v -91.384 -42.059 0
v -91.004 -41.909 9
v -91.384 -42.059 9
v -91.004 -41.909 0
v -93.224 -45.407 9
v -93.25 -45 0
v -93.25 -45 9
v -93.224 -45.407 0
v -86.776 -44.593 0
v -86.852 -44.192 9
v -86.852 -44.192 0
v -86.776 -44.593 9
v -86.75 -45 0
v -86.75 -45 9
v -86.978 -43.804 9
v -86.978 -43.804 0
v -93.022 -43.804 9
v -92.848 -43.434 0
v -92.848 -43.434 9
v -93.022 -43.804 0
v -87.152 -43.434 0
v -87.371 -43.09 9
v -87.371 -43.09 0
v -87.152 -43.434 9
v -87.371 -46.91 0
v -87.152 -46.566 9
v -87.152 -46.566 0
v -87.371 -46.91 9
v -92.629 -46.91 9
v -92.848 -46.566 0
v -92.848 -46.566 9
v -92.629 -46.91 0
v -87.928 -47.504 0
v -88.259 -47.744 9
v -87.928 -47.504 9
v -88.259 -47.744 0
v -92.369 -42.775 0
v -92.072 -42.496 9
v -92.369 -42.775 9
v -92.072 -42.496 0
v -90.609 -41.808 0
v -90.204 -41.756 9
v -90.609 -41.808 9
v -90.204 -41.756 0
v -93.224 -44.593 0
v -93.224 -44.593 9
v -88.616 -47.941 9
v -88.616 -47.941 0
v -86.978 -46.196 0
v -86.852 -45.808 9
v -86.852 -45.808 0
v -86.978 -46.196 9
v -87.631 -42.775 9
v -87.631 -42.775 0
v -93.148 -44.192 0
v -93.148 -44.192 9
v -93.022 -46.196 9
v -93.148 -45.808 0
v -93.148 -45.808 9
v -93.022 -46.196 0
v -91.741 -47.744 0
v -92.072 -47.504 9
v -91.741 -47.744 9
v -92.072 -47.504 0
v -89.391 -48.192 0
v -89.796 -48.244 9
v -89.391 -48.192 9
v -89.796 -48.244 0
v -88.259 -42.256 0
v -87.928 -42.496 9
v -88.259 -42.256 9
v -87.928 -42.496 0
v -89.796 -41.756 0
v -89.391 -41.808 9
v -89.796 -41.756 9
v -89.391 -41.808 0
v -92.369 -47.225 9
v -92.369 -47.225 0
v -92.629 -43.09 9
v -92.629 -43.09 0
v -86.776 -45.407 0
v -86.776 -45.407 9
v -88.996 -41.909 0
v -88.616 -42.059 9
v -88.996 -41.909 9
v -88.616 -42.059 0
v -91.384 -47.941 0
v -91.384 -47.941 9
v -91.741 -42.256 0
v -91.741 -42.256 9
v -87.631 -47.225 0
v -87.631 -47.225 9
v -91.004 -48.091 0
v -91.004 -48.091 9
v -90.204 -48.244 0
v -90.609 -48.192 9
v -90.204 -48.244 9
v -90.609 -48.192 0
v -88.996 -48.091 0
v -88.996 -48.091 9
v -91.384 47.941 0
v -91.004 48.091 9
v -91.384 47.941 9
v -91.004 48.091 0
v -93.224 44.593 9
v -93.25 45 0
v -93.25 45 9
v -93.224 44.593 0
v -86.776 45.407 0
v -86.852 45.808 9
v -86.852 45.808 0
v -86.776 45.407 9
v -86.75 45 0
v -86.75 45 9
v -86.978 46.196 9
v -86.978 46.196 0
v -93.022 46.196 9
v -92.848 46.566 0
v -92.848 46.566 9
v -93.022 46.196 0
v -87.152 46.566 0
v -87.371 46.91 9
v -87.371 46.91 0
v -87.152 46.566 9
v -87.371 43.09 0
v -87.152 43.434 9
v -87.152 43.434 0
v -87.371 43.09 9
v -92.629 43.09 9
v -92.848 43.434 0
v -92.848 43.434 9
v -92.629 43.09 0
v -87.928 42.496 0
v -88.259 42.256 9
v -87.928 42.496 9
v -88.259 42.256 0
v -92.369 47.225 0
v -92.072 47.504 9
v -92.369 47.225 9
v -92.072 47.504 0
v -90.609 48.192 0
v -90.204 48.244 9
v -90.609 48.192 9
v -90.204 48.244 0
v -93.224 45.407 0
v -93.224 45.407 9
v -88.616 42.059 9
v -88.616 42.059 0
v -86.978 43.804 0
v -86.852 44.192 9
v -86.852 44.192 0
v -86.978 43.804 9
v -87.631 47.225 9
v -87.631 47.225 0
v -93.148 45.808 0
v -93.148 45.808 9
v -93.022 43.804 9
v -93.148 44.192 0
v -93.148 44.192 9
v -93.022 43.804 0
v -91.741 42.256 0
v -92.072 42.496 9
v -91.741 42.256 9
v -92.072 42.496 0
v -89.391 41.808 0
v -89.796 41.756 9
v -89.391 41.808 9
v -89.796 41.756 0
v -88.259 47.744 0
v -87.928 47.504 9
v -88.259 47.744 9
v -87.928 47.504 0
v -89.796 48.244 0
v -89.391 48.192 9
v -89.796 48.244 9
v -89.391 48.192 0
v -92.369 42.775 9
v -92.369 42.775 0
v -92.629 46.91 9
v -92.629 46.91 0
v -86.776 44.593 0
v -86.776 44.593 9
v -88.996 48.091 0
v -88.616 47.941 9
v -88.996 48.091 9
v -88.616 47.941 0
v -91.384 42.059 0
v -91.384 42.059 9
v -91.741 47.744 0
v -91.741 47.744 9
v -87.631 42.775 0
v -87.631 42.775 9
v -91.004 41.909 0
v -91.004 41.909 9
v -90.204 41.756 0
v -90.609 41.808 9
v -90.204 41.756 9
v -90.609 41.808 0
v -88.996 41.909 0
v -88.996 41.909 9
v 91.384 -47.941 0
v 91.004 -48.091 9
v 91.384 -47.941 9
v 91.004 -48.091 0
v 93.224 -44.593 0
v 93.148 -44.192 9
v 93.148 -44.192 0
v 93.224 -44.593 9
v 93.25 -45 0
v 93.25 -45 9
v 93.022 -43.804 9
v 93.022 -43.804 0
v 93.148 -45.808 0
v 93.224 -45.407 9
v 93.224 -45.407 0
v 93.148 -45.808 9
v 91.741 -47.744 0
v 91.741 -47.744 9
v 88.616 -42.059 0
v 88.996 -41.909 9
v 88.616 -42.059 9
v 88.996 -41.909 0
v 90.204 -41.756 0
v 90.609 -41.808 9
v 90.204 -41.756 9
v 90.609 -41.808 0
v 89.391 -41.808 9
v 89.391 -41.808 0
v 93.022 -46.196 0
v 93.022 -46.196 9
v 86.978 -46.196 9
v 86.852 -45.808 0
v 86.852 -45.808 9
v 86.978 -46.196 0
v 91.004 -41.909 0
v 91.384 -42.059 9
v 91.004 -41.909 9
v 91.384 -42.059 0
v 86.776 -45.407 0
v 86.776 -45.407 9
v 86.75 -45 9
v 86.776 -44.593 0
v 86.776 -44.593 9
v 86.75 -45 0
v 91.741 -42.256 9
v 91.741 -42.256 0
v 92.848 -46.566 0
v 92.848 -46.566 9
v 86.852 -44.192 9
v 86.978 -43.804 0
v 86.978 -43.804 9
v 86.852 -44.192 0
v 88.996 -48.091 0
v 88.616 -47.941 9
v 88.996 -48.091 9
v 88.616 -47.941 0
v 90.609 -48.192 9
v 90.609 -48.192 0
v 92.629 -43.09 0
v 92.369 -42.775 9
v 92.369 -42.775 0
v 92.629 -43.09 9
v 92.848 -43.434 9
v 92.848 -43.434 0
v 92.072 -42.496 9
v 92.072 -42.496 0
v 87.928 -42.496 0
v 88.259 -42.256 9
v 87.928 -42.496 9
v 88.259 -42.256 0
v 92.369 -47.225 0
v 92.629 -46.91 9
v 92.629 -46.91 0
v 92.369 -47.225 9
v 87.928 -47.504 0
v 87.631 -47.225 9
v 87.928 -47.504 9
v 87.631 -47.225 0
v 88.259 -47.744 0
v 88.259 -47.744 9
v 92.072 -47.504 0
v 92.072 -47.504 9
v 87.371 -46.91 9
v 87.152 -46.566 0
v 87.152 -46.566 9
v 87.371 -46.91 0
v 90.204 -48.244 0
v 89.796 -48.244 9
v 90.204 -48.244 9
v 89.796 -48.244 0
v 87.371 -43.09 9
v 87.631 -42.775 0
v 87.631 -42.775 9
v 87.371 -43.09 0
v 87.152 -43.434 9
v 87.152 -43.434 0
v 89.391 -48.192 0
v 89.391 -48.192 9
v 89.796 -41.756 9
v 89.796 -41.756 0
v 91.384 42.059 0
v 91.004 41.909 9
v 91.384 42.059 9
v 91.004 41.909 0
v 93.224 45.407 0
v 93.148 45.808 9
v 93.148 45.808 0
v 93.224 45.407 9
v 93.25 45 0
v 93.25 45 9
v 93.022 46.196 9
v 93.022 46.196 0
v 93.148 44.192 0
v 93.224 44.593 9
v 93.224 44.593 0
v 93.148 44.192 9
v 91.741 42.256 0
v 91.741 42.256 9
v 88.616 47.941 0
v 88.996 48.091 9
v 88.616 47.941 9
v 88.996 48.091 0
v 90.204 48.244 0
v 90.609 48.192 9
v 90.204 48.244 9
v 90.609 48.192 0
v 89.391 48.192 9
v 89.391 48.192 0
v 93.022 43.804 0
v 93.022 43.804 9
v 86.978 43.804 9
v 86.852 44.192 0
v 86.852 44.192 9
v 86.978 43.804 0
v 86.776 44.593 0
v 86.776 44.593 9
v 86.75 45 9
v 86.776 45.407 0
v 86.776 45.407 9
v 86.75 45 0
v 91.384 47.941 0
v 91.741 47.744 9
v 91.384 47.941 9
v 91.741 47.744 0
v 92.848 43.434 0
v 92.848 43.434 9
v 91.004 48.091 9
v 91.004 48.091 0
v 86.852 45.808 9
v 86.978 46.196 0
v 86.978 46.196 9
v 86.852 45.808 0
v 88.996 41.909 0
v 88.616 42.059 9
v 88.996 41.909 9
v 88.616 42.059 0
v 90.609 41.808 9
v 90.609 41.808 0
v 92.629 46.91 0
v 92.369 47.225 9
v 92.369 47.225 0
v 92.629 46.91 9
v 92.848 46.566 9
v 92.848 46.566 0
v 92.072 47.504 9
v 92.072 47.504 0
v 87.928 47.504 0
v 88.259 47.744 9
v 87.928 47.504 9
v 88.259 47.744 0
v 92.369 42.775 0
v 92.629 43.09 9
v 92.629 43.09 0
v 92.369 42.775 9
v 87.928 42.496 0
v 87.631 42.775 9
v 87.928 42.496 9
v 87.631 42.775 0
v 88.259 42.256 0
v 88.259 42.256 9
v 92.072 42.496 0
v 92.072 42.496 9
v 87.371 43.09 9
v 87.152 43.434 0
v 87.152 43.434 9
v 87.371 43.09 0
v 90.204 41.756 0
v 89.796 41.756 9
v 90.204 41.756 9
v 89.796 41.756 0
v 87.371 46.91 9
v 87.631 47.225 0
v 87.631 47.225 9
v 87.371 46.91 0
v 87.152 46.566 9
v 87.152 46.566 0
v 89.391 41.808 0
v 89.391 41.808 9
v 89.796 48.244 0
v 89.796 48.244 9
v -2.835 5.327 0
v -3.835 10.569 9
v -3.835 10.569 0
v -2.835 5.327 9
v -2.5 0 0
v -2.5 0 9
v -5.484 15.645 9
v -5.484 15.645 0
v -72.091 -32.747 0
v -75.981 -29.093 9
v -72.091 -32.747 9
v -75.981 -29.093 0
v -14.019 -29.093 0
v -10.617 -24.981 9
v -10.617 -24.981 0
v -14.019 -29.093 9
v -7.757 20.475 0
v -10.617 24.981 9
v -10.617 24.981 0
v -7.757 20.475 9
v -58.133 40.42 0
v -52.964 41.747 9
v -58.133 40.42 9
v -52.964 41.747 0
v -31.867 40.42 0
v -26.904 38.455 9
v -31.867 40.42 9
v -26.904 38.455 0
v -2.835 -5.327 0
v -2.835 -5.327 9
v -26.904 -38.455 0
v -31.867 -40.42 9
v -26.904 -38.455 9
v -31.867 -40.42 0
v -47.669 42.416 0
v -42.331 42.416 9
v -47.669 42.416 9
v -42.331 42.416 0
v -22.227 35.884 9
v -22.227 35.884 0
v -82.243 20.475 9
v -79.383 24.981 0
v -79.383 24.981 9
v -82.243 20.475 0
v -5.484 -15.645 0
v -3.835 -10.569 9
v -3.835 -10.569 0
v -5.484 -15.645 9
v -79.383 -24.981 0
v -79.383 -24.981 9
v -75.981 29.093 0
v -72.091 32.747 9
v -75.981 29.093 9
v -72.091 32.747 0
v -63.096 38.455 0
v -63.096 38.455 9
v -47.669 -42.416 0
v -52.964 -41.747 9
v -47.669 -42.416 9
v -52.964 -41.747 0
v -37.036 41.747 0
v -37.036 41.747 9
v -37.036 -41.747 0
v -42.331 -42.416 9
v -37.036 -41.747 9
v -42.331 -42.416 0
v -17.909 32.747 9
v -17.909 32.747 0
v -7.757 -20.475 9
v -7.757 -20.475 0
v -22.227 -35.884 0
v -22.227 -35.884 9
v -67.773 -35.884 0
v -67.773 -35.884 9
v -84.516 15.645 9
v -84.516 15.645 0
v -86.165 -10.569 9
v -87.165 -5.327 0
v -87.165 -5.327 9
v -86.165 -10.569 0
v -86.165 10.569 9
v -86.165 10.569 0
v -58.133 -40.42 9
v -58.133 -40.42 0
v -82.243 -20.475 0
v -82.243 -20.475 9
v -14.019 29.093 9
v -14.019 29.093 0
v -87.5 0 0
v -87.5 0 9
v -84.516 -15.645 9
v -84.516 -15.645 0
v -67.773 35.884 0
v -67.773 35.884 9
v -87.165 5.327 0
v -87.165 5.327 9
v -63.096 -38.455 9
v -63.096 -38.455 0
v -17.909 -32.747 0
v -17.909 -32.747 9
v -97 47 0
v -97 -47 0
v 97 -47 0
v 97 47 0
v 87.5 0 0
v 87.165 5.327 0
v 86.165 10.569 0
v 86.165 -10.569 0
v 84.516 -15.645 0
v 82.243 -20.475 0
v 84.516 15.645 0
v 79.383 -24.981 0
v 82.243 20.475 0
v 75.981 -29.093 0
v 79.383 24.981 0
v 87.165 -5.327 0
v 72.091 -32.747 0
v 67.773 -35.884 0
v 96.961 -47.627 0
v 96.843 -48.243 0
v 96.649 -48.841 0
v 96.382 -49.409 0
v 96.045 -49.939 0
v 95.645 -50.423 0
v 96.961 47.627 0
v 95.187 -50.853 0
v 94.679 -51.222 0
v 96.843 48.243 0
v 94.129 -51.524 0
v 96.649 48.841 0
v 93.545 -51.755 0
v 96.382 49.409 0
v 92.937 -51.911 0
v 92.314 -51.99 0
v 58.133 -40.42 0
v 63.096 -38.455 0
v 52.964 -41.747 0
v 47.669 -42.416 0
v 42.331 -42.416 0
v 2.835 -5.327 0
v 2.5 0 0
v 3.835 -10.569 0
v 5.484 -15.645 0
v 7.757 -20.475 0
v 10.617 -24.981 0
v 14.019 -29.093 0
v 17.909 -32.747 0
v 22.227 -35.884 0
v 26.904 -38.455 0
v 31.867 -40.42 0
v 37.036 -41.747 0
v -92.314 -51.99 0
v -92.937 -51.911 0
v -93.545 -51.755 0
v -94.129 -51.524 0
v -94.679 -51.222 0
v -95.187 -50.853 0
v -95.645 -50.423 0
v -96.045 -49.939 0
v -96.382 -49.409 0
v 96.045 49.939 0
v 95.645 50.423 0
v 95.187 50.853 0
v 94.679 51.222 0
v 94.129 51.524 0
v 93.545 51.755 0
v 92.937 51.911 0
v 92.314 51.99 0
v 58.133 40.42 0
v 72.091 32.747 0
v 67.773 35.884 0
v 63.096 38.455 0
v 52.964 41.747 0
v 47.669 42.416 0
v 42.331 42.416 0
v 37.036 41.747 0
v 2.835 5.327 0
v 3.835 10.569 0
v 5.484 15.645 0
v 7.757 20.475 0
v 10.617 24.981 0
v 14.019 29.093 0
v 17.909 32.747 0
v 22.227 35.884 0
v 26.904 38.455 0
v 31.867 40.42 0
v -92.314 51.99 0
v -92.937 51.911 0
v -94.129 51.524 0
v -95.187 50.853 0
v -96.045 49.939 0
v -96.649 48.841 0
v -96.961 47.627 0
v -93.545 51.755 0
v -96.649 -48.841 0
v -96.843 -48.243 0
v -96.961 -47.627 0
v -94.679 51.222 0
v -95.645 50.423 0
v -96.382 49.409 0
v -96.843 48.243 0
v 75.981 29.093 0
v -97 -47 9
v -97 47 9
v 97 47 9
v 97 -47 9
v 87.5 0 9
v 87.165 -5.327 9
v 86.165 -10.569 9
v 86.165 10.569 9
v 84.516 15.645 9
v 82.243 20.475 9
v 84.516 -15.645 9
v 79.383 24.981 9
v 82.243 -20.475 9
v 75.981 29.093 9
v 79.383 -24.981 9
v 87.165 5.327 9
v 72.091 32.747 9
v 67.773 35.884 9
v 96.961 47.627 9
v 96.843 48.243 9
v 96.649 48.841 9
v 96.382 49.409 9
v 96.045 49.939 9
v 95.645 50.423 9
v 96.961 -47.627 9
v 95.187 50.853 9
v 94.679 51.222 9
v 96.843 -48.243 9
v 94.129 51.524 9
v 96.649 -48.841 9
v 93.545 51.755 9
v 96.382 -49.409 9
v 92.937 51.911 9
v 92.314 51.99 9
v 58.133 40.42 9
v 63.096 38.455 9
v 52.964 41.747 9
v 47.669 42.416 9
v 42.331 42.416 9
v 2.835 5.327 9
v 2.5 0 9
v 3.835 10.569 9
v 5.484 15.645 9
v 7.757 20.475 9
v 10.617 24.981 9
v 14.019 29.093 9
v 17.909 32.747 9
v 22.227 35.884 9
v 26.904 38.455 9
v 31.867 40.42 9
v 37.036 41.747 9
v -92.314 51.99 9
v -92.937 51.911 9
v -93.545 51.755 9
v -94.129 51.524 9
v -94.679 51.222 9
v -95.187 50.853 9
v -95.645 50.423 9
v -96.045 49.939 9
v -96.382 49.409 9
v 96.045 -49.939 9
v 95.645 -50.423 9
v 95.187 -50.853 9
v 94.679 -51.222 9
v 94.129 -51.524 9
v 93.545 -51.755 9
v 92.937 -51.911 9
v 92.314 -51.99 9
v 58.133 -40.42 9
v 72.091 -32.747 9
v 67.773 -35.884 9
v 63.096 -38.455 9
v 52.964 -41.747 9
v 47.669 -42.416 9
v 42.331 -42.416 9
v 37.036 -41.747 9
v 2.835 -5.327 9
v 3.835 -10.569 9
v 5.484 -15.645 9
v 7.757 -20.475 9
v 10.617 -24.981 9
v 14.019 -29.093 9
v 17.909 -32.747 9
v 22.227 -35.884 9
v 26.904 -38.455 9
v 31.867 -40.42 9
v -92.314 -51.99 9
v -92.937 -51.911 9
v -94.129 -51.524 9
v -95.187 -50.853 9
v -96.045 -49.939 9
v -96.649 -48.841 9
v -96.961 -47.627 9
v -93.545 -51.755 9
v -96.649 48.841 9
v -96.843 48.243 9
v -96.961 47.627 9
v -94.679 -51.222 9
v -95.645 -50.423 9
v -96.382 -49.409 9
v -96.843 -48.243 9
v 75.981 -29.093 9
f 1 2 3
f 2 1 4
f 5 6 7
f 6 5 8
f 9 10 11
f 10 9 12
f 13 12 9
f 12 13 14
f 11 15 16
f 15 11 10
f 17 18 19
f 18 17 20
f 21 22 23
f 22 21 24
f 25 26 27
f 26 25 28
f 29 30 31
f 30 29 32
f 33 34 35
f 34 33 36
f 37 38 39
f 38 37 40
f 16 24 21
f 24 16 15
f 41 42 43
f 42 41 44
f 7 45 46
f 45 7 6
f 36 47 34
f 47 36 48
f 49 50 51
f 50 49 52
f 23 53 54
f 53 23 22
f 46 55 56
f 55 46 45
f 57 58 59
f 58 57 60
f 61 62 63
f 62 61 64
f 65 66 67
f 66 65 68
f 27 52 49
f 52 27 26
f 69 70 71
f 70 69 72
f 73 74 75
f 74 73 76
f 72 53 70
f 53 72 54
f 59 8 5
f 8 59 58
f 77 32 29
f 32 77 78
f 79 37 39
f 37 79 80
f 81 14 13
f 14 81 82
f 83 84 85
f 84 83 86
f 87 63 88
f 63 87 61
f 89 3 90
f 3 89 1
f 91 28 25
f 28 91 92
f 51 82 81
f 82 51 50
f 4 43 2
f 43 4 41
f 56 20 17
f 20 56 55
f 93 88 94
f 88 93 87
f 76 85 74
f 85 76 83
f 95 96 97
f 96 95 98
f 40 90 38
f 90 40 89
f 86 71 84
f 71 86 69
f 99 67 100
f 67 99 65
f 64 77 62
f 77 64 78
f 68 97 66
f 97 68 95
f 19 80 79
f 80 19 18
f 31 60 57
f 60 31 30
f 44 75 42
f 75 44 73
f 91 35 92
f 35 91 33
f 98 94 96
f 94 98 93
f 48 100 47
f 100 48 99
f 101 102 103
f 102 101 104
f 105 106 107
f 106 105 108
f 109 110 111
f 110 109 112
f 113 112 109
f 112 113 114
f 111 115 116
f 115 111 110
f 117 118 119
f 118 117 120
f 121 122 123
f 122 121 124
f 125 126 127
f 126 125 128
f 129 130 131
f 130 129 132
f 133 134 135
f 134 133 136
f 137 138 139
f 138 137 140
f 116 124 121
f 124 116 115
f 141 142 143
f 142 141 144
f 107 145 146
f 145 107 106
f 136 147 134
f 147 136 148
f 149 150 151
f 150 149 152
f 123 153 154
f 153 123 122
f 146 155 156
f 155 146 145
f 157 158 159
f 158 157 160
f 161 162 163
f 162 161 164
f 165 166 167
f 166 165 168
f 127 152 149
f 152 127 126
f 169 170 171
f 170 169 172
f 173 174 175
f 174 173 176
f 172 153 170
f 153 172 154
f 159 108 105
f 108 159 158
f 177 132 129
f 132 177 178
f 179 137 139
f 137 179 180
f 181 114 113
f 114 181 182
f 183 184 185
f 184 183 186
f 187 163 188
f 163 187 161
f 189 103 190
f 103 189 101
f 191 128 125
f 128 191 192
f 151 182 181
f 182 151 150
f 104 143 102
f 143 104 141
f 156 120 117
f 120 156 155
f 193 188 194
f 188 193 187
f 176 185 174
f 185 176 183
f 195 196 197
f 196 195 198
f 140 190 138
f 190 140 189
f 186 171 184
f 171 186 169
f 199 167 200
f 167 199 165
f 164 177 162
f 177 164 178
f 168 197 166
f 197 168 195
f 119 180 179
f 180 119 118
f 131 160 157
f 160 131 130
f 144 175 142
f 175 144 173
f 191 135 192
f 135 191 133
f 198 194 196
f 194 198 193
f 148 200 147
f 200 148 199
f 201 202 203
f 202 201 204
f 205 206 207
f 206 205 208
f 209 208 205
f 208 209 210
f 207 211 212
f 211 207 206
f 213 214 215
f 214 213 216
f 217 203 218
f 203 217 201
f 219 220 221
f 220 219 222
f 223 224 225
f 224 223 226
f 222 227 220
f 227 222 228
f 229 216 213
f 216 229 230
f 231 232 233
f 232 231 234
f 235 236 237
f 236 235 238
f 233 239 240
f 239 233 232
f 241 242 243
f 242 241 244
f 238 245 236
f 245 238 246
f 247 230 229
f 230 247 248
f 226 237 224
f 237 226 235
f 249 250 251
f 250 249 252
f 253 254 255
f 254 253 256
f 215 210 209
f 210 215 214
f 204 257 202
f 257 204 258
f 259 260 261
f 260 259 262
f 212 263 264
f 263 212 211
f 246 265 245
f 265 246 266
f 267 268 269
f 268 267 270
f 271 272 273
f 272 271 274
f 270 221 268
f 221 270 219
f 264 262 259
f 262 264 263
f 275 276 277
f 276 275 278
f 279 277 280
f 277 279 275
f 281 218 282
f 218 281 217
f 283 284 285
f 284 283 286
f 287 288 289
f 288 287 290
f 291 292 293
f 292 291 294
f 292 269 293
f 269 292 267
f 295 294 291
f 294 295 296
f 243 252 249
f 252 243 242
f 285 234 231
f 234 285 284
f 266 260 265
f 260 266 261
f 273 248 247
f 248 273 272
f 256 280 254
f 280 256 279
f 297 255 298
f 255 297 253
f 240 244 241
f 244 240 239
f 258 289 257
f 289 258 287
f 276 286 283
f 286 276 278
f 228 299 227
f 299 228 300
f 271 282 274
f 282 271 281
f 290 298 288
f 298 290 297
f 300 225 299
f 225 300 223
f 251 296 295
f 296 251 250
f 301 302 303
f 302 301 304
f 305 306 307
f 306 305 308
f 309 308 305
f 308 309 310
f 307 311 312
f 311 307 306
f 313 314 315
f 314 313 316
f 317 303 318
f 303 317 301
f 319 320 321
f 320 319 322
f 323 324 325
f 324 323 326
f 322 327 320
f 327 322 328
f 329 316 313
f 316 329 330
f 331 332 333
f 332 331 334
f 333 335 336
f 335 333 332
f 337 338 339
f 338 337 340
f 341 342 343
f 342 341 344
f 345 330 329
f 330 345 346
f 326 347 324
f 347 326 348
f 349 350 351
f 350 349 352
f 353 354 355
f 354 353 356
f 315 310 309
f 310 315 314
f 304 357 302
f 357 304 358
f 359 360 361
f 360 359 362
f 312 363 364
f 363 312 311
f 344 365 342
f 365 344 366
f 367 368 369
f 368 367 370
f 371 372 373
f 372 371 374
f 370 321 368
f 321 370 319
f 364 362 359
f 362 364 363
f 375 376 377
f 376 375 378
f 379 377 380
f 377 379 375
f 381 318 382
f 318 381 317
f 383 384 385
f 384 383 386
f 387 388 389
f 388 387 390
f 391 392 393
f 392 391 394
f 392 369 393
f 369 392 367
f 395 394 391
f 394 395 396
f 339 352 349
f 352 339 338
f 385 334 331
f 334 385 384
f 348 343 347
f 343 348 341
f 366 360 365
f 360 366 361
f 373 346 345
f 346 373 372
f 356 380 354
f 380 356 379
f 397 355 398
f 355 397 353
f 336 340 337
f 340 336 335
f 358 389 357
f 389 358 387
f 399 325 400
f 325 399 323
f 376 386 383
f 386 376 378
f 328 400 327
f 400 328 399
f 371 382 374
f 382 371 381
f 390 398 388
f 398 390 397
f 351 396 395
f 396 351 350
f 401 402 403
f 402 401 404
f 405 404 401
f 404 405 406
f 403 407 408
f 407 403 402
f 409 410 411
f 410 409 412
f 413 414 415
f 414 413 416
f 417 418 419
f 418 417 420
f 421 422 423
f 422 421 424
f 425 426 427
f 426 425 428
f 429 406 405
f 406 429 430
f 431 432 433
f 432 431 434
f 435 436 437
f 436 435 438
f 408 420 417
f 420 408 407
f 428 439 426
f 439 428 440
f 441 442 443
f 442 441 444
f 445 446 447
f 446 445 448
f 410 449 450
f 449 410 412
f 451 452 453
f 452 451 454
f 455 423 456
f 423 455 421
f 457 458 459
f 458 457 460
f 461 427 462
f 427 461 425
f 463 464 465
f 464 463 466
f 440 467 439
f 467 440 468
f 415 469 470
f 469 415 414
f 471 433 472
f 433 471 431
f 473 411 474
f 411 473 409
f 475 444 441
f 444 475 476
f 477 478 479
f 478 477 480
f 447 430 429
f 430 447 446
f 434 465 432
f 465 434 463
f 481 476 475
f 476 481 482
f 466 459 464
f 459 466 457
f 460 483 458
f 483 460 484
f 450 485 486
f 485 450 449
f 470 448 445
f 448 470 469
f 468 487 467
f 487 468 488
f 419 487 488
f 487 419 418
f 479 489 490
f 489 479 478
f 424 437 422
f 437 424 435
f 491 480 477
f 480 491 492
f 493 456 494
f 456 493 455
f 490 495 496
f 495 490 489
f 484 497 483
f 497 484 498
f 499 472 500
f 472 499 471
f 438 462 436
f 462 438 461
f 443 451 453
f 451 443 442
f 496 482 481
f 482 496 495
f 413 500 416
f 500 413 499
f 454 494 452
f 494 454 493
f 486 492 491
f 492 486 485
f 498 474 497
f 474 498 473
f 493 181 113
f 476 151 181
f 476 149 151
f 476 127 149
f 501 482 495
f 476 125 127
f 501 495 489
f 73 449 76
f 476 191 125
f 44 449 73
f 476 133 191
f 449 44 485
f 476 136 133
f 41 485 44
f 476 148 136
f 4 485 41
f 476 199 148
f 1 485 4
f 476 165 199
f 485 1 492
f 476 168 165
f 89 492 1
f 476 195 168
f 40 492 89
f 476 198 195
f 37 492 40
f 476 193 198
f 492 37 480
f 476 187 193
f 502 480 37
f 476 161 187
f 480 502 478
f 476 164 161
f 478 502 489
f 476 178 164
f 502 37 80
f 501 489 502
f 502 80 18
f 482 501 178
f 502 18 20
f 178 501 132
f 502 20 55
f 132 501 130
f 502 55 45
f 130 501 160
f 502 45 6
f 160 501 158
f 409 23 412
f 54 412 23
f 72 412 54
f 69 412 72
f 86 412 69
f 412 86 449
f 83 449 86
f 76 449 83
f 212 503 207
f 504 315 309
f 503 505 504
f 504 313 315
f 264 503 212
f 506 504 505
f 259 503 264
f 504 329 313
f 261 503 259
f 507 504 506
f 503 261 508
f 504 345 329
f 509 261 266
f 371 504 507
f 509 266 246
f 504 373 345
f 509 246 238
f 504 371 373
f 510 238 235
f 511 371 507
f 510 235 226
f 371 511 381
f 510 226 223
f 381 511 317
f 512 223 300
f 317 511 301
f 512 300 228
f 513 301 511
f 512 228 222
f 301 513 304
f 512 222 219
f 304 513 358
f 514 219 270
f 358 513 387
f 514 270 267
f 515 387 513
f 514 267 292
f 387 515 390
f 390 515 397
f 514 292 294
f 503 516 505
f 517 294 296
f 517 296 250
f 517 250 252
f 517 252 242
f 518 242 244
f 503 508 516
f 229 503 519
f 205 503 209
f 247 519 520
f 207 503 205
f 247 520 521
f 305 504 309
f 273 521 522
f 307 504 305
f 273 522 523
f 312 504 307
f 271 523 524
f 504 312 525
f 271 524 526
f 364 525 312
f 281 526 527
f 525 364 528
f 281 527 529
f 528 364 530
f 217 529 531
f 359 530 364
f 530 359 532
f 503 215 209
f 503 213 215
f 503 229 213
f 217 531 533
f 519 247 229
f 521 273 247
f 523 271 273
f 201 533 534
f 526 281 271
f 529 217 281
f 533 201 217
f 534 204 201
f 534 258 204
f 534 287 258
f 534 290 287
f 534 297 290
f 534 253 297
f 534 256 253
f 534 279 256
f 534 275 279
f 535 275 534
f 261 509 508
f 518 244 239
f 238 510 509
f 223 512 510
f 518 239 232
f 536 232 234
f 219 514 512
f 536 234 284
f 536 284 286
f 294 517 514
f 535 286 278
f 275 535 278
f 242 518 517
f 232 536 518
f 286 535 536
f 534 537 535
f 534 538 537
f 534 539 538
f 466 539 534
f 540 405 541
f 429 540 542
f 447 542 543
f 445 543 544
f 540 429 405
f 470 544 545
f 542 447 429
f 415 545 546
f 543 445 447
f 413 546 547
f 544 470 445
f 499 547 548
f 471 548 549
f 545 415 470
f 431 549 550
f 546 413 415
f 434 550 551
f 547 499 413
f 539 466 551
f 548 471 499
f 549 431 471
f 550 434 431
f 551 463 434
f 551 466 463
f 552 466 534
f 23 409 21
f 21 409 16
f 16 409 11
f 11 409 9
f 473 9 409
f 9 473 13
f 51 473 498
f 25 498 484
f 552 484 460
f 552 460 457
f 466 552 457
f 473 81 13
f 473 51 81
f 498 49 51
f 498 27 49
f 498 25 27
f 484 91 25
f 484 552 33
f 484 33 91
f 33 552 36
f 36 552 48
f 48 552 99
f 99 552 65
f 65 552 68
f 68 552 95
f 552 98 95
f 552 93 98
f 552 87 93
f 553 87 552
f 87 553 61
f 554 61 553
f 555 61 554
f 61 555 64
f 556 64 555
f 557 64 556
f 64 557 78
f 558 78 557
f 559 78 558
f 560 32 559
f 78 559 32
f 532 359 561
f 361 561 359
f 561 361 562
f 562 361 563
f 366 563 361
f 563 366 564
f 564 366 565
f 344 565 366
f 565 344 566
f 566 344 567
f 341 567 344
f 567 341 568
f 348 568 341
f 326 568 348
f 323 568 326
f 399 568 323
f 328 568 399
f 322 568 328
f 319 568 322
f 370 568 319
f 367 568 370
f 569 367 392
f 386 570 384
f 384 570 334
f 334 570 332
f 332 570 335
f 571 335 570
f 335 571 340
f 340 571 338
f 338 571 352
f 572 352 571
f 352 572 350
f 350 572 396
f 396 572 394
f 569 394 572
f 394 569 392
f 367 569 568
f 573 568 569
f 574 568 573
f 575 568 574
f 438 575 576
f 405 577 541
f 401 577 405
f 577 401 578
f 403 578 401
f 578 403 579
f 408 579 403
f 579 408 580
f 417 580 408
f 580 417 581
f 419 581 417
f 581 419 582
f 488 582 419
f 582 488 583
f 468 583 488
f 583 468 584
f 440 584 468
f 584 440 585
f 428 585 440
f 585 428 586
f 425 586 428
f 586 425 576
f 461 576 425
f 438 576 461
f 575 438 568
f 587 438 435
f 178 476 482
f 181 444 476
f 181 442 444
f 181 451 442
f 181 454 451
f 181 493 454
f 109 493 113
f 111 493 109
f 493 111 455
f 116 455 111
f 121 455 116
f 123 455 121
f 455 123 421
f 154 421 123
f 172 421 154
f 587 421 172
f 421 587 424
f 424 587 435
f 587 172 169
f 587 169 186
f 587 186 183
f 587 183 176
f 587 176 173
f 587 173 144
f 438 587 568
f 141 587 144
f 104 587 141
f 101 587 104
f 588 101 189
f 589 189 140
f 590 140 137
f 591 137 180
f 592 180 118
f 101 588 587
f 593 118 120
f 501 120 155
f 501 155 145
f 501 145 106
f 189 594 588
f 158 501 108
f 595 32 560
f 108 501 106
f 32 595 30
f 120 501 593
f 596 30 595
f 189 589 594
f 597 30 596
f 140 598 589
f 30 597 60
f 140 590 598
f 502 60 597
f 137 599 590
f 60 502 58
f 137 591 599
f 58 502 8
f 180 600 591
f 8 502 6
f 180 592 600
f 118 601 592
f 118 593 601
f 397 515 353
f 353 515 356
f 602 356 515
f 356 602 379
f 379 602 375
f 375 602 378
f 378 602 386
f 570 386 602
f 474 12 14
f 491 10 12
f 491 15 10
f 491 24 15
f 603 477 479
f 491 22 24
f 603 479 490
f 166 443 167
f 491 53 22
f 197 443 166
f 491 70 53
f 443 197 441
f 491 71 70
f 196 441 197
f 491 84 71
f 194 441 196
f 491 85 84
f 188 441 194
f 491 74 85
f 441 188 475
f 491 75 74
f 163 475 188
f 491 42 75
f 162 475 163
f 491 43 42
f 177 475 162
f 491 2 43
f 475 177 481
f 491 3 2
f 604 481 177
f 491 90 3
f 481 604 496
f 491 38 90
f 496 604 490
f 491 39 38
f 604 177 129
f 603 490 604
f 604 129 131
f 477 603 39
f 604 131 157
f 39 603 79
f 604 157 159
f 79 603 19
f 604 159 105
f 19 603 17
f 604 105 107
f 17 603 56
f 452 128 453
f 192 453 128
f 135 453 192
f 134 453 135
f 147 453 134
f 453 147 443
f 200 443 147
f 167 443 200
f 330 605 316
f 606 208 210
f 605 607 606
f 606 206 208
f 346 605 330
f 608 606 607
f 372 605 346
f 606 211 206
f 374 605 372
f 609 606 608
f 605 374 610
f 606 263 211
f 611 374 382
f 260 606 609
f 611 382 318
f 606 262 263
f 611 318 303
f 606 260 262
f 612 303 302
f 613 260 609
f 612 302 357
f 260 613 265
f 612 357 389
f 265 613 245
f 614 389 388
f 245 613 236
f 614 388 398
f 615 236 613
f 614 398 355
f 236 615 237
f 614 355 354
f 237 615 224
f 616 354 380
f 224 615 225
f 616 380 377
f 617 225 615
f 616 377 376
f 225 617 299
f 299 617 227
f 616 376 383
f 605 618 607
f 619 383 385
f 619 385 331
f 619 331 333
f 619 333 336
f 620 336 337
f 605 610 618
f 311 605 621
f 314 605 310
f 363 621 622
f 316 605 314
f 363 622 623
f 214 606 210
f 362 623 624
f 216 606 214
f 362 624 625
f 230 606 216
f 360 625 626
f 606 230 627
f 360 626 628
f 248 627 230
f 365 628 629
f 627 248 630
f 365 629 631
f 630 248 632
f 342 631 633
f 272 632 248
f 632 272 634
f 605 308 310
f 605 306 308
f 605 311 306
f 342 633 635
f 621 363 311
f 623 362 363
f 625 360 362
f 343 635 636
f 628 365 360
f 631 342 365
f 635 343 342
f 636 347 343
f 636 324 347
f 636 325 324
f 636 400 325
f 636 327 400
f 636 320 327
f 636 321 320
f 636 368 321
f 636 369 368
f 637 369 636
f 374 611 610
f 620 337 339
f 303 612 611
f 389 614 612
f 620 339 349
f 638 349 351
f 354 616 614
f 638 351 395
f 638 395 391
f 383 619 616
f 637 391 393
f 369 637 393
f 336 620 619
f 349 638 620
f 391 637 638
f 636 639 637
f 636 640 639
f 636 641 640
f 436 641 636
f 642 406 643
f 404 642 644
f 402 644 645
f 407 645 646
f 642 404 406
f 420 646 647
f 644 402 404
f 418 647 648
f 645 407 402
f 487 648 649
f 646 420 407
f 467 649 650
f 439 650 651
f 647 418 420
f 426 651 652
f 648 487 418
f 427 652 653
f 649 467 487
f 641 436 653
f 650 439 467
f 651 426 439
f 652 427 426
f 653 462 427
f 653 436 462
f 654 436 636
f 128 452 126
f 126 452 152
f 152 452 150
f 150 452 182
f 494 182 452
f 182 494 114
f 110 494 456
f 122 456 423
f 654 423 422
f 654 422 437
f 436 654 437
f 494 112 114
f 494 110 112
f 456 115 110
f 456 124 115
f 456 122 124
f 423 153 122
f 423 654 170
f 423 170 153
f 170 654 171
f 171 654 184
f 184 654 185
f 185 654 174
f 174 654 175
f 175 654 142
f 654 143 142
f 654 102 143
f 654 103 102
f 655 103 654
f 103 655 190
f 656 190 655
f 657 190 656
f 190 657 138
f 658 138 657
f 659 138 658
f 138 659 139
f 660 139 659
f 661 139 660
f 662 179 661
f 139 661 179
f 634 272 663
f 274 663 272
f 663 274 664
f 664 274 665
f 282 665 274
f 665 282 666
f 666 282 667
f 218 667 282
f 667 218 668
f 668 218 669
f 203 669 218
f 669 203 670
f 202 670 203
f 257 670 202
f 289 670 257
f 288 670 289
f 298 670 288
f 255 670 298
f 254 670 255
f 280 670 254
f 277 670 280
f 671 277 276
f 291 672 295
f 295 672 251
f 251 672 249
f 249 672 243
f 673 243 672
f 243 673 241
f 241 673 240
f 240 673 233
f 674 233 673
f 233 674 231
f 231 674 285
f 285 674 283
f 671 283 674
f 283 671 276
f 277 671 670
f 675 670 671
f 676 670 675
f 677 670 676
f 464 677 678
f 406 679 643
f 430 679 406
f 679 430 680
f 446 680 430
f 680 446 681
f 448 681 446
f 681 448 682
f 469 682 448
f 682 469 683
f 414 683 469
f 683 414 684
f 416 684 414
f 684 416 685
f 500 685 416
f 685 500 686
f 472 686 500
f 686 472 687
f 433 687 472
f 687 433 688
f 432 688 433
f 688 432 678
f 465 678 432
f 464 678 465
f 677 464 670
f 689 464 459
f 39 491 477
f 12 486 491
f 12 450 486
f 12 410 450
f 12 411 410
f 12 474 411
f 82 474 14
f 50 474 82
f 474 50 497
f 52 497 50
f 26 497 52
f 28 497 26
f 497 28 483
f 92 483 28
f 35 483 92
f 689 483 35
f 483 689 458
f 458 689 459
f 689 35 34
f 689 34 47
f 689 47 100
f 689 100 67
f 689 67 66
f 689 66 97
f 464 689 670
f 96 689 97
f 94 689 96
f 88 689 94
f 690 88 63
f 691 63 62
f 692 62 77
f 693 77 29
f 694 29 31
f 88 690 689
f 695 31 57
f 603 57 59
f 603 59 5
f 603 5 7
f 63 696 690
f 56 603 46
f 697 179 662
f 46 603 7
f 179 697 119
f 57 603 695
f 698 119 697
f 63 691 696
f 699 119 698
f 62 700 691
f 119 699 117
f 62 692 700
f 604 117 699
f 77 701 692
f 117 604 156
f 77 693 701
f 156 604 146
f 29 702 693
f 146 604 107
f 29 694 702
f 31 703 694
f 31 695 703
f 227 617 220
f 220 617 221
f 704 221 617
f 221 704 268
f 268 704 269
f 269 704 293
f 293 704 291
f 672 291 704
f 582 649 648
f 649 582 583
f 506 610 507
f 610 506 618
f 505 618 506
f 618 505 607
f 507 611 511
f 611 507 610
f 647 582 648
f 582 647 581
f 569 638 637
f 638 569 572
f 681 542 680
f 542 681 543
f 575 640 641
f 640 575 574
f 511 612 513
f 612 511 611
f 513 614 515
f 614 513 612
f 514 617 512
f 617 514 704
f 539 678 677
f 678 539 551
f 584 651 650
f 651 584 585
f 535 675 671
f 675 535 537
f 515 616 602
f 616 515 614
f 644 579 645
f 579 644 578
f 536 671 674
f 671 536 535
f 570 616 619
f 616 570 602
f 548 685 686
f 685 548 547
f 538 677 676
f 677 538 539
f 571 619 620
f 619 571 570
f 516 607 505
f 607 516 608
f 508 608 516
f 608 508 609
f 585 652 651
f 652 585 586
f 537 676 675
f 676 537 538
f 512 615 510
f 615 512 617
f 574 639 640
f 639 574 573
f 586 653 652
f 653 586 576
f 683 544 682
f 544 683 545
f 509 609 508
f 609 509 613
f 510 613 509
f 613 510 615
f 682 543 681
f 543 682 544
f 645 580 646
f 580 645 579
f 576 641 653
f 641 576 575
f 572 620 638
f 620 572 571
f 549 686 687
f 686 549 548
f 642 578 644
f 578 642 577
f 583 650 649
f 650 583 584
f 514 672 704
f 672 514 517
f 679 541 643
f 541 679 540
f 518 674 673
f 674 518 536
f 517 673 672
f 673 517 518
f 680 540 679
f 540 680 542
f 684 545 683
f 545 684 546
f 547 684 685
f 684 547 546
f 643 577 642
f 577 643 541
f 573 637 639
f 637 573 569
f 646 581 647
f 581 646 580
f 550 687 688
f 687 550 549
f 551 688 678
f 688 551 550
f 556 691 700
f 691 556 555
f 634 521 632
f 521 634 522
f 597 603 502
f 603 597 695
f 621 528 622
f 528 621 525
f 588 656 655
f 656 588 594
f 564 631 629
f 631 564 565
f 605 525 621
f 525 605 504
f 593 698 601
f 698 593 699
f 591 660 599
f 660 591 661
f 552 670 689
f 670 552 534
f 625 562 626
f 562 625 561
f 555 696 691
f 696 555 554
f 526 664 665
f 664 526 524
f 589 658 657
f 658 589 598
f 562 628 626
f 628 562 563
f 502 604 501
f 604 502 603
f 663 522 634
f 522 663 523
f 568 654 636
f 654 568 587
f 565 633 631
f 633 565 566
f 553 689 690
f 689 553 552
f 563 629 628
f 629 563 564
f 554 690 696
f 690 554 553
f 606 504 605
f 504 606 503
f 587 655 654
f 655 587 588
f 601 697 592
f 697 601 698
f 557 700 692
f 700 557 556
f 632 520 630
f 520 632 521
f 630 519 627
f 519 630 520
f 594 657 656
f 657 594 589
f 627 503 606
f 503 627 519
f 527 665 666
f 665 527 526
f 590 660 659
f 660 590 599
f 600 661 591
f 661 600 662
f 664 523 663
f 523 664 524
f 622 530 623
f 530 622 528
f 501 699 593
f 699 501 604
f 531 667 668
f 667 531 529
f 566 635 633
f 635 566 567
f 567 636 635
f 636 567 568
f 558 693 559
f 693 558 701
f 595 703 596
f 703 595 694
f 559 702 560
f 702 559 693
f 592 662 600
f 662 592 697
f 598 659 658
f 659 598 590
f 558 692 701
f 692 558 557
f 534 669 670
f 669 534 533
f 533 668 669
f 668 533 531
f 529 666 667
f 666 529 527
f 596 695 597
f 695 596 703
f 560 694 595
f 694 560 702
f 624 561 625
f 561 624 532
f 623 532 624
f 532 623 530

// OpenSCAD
$fn = 50;


difference() {
	union() {
		hull() {
			translate(v = [-92.0000000000, 47.0000000000, 0]) {
				cylinder(h = 9, r = 5);
			}
			translate(v = [92.0000000000, 47.0000000000, 0]) {
				cylinder(h = 9, r = 5);
			}
			translate(v = [-92.0000000000, -47.0000000000, 0]) {
				cylinder(h = 9, r = 5);
			}
			translate(v = [92.0000000000, -47.0000000000, 0]) {
				cylinder(h = 9, r = 5);
			}
		}
	}
	union() {
		#translate(v = [-90.0000000000, -45.0000000000, -100.0000000000]) {
			cylinder(h = 200, r = 3.2500000000);
		}
		#translate(v = [-90.0000000000, 45.0000000000, -100.0000000000]) {
			cylinder(h = 200, r = 3.2500000000);
		}
		#translate(v = [90.0000000000, -45.0000000000, -100.0000000000]) {
			cylinder(h = 200, r = 3.2500000000);
		}
		#translate(v = [90.0000000000, 45.0000000000, -100.0000000000]) {
			cylinder(h = 200, r = 3.2500000000);
		}
		#translate(v = [-45.0000000000, 0, 0]) {
			cylinder(h = 9, r = 42.5000000000);
		}
		#translate(v = [45.0000000000, 0, 0]) {
			cylinder(h = 9, r = 42.5000000000);
		}
	}
}
